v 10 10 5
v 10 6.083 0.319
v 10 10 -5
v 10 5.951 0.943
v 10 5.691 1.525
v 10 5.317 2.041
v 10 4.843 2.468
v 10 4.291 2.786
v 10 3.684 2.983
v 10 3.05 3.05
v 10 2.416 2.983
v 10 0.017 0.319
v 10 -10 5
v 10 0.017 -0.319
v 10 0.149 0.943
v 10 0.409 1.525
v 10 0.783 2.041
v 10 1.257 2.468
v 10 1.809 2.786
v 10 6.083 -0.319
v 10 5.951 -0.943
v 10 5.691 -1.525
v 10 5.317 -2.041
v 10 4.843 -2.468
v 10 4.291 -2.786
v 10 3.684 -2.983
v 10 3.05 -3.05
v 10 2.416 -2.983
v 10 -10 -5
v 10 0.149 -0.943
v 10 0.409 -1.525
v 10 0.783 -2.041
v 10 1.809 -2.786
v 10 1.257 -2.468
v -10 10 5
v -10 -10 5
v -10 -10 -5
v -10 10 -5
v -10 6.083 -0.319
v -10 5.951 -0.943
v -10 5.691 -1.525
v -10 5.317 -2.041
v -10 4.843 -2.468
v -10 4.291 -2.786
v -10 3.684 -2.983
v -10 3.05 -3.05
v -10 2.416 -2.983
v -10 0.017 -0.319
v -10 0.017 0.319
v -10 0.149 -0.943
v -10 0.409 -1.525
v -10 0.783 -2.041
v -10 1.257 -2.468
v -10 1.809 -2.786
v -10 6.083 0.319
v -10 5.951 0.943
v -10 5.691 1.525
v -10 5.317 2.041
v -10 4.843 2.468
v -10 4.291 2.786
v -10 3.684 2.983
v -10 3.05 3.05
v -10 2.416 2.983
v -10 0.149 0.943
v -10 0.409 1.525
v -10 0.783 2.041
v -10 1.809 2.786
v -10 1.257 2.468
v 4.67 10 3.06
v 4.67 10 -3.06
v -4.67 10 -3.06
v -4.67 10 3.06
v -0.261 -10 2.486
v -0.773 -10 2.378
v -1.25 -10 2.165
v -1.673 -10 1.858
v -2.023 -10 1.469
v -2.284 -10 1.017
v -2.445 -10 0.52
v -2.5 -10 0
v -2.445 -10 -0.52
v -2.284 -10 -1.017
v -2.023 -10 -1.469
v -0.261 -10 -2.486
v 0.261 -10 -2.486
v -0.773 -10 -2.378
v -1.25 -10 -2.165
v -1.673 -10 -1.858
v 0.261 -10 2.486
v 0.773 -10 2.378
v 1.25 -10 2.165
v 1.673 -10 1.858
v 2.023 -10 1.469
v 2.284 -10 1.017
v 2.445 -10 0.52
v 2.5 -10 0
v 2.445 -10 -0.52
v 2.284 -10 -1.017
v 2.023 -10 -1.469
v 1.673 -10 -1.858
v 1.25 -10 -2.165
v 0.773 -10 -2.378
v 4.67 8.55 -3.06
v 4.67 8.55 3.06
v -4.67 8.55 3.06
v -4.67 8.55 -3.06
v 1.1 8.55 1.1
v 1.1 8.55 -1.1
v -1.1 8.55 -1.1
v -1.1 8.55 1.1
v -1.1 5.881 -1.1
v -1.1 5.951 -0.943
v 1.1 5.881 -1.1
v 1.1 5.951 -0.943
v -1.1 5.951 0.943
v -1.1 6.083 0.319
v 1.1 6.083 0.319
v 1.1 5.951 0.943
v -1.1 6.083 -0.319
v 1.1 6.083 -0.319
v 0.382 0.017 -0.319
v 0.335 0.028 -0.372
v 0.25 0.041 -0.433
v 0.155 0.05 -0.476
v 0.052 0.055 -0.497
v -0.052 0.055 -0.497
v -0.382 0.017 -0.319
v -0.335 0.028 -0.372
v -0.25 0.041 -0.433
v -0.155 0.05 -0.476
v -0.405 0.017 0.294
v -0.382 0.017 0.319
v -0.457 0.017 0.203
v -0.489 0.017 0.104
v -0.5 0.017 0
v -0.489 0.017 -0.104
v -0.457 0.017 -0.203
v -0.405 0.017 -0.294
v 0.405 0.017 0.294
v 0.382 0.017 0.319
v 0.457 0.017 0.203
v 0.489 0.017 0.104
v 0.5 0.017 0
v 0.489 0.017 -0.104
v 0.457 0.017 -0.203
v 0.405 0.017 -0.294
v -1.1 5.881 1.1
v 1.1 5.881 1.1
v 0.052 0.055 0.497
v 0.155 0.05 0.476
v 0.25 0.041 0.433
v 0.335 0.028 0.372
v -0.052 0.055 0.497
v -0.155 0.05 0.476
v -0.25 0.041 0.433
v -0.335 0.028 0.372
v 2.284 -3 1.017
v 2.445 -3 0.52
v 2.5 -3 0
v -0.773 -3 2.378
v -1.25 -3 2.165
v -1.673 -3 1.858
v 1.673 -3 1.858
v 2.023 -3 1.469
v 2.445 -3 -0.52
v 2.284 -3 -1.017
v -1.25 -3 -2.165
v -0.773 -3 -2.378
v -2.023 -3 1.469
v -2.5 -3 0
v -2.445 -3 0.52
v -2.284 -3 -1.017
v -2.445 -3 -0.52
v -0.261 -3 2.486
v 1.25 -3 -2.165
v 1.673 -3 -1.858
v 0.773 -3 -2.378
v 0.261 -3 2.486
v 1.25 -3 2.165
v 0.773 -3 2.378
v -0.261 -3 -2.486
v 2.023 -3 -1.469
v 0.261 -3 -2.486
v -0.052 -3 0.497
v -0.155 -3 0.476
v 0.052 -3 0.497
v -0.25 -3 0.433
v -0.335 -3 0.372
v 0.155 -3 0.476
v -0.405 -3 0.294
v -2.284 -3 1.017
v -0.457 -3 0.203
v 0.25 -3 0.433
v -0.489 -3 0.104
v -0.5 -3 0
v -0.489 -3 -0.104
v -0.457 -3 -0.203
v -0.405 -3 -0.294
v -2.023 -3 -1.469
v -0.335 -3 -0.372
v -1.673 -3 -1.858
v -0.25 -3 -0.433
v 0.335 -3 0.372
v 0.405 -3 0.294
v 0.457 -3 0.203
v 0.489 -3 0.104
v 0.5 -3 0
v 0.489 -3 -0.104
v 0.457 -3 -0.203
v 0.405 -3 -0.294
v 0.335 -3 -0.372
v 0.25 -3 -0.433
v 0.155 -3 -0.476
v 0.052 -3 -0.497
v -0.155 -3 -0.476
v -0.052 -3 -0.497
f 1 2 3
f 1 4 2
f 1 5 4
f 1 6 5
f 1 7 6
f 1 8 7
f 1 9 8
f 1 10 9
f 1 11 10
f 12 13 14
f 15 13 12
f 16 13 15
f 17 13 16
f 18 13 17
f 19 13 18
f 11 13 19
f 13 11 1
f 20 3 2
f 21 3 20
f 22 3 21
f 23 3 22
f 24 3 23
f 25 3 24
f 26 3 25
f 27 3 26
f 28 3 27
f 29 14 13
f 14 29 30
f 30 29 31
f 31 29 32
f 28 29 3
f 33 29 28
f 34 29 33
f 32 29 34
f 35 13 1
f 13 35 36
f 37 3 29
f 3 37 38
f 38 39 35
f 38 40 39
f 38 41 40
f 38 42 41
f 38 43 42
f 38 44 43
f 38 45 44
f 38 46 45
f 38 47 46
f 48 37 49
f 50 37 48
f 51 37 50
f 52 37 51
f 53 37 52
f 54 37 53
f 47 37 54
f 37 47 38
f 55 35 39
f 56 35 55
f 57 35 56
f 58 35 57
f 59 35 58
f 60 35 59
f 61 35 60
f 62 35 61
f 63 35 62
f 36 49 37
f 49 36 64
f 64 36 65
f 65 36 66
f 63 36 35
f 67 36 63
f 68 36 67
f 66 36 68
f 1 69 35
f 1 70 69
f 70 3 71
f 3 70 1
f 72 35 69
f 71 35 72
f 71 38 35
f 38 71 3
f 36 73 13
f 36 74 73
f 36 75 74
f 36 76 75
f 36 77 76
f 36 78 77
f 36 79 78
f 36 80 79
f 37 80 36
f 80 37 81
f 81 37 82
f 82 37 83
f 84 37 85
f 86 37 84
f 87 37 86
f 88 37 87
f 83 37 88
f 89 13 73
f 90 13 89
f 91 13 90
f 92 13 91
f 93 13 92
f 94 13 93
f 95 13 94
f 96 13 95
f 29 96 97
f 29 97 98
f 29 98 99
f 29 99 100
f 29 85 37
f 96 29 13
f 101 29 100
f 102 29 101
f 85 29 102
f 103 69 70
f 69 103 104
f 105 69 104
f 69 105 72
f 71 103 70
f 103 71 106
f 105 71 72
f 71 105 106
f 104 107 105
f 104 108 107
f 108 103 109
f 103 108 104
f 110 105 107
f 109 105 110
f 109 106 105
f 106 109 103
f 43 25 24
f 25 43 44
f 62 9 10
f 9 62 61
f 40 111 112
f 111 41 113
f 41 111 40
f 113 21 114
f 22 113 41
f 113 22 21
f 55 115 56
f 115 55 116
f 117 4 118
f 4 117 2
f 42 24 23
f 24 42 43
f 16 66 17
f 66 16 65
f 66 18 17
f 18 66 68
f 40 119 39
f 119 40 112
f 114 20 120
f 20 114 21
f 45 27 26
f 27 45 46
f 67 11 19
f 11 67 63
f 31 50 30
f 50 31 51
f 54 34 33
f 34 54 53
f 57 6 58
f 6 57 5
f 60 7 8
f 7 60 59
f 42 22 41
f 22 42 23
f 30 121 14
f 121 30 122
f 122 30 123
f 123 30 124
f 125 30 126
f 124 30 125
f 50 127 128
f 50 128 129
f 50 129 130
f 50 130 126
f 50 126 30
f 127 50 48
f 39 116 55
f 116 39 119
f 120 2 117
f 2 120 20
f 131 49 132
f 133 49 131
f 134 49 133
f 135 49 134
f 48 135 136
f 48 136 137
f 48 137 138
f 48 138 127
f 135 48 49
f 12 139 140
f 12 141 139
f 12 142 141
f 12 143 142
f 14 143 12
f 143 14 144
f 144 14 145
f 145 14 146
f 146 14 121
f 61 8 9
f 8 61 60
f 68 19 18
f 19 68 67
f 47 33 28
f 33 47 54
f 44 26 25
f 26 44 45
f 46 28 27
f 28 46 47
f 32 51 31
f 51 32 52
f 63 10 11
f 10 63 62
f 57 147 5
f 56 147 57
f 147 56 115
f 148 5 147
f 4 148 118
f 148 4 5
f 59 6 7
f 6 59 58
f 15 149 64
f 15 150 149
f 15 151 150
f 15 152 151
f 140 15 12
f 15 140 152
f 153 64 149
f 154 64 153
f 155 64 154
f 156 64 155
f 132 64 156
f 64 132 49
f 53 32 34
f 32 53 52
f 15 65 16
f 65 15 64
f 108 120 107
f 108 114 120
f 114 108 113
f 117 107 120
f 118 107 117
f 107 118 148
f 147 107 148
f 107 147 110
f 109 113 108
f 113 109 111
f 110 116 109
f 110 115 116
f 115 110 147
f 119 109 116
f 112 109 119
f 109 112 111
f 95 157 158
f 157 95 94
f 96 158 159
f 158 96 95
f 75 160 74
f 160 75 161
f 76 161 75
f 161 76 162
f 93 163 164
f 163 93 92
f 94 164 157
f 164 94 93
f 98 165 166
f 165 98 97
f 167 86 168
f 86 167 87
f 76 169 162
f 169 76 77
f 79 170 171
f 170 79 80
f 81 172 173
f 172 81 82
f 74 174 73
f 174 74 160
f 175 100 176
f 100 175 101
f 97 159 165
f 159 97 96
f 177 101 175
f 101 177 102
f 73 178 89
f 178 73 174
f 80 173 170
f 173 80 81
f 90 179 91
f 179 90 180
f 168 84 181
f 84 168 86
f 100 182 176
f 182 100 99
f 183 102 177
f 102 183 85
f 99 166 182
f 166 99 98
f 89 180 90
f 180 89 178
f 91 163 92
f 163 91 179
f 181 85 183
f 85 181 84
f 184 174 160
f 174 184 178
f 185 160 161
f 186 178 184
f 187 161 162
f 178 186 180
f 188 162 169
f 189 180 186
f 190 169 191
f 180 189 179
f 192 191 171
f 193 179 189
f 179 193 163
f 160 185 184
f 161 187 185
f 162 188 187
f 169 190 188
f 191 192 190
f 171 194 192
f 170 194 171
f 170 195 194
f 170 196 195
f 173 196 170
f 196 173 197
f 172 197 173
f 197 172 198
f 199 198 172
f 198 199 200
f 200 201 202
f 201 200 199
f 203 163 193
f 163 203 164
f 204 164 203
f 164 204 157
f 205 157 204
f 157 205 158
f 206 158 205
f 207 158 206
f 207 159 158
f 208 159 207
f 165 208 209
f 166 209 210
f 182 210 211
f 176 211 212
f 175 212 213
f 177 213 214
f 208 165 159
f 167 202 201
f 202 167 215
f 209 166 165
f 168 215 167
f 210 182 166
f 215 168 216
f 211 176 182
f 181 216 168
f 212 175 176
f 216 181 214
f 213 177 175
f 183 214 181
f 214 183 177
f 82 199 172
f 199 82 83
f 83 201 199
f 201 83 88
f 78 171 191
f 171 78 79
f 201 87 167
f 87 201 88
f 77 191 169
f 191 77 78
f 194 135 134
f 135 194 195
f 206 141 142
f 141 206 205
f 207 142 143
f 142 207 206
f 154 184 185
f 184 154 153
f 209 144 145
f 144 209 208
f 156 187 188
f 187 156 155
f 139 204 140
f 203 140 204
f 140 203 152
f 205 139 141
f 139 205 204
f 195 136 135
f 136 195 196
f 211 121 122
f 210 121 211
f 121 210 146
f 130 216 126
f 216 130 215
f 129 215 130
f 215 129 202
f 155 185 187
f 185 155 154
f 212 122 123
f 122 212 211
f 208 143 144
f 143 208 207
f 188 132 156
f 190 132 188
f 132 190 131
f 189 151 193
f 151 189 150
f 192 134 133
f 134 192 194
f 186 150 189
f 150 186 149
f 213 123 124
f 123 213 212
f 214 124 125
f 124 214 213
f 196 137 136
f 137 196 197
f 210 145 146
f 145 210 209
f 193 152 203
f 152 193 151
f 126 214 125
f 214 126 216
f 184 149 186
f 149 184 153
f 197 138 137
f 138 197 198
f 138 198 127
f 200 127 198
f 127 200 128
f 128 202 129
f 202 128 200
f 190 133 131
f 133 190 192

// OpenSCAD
// ******Flow Through colorimeter Nano Castro, Pablo Cremades****//

$fn=30;
// Parametros del cubo de medición
cube_h=10; 
cube_w=20;
cube_l=20;
// Parámetros del OPT101
sensor_w=6.12;
sensor_l=9.34;
sensor_depth=1.45;
// Parametros de photodiodo
photo_w=2.2;
// Parametros del tubo
tube_diam=6.10;
// Parametros del LED
led_diam=5;
led_l=7;
// Parametro haz de luz
light_diam=1;

difference(){

cube([cube_l,cube_w,cube_h],center=true);

translate([0,cube_w/2-sensor_depth/2,0])
cube([sensor_l,sensor_depth,sensor_w],center=true);//abertura para sensor
rotate([0,90,0])
translate([0,tube_diam/2,0])
    cylinder(r=tube_diam/2,h=2*cube_l,center=true);//abertura para paso del tubo de fluido
 
translate([0,cube_w/2-tube_diam/2,0])
    cube([photo_w,tube_diam,photo_w],center=true);
translate([0,-cube_w/2+led_l/2,0])
rotate([90,0,0])
    cylinder(r=led_diam/2,h=led_l,center=true);//abertura para led
rotate([90,0,0]) 
#cylinder(r=light_diam/2,h=1.5*cube_w,center=true);
}
